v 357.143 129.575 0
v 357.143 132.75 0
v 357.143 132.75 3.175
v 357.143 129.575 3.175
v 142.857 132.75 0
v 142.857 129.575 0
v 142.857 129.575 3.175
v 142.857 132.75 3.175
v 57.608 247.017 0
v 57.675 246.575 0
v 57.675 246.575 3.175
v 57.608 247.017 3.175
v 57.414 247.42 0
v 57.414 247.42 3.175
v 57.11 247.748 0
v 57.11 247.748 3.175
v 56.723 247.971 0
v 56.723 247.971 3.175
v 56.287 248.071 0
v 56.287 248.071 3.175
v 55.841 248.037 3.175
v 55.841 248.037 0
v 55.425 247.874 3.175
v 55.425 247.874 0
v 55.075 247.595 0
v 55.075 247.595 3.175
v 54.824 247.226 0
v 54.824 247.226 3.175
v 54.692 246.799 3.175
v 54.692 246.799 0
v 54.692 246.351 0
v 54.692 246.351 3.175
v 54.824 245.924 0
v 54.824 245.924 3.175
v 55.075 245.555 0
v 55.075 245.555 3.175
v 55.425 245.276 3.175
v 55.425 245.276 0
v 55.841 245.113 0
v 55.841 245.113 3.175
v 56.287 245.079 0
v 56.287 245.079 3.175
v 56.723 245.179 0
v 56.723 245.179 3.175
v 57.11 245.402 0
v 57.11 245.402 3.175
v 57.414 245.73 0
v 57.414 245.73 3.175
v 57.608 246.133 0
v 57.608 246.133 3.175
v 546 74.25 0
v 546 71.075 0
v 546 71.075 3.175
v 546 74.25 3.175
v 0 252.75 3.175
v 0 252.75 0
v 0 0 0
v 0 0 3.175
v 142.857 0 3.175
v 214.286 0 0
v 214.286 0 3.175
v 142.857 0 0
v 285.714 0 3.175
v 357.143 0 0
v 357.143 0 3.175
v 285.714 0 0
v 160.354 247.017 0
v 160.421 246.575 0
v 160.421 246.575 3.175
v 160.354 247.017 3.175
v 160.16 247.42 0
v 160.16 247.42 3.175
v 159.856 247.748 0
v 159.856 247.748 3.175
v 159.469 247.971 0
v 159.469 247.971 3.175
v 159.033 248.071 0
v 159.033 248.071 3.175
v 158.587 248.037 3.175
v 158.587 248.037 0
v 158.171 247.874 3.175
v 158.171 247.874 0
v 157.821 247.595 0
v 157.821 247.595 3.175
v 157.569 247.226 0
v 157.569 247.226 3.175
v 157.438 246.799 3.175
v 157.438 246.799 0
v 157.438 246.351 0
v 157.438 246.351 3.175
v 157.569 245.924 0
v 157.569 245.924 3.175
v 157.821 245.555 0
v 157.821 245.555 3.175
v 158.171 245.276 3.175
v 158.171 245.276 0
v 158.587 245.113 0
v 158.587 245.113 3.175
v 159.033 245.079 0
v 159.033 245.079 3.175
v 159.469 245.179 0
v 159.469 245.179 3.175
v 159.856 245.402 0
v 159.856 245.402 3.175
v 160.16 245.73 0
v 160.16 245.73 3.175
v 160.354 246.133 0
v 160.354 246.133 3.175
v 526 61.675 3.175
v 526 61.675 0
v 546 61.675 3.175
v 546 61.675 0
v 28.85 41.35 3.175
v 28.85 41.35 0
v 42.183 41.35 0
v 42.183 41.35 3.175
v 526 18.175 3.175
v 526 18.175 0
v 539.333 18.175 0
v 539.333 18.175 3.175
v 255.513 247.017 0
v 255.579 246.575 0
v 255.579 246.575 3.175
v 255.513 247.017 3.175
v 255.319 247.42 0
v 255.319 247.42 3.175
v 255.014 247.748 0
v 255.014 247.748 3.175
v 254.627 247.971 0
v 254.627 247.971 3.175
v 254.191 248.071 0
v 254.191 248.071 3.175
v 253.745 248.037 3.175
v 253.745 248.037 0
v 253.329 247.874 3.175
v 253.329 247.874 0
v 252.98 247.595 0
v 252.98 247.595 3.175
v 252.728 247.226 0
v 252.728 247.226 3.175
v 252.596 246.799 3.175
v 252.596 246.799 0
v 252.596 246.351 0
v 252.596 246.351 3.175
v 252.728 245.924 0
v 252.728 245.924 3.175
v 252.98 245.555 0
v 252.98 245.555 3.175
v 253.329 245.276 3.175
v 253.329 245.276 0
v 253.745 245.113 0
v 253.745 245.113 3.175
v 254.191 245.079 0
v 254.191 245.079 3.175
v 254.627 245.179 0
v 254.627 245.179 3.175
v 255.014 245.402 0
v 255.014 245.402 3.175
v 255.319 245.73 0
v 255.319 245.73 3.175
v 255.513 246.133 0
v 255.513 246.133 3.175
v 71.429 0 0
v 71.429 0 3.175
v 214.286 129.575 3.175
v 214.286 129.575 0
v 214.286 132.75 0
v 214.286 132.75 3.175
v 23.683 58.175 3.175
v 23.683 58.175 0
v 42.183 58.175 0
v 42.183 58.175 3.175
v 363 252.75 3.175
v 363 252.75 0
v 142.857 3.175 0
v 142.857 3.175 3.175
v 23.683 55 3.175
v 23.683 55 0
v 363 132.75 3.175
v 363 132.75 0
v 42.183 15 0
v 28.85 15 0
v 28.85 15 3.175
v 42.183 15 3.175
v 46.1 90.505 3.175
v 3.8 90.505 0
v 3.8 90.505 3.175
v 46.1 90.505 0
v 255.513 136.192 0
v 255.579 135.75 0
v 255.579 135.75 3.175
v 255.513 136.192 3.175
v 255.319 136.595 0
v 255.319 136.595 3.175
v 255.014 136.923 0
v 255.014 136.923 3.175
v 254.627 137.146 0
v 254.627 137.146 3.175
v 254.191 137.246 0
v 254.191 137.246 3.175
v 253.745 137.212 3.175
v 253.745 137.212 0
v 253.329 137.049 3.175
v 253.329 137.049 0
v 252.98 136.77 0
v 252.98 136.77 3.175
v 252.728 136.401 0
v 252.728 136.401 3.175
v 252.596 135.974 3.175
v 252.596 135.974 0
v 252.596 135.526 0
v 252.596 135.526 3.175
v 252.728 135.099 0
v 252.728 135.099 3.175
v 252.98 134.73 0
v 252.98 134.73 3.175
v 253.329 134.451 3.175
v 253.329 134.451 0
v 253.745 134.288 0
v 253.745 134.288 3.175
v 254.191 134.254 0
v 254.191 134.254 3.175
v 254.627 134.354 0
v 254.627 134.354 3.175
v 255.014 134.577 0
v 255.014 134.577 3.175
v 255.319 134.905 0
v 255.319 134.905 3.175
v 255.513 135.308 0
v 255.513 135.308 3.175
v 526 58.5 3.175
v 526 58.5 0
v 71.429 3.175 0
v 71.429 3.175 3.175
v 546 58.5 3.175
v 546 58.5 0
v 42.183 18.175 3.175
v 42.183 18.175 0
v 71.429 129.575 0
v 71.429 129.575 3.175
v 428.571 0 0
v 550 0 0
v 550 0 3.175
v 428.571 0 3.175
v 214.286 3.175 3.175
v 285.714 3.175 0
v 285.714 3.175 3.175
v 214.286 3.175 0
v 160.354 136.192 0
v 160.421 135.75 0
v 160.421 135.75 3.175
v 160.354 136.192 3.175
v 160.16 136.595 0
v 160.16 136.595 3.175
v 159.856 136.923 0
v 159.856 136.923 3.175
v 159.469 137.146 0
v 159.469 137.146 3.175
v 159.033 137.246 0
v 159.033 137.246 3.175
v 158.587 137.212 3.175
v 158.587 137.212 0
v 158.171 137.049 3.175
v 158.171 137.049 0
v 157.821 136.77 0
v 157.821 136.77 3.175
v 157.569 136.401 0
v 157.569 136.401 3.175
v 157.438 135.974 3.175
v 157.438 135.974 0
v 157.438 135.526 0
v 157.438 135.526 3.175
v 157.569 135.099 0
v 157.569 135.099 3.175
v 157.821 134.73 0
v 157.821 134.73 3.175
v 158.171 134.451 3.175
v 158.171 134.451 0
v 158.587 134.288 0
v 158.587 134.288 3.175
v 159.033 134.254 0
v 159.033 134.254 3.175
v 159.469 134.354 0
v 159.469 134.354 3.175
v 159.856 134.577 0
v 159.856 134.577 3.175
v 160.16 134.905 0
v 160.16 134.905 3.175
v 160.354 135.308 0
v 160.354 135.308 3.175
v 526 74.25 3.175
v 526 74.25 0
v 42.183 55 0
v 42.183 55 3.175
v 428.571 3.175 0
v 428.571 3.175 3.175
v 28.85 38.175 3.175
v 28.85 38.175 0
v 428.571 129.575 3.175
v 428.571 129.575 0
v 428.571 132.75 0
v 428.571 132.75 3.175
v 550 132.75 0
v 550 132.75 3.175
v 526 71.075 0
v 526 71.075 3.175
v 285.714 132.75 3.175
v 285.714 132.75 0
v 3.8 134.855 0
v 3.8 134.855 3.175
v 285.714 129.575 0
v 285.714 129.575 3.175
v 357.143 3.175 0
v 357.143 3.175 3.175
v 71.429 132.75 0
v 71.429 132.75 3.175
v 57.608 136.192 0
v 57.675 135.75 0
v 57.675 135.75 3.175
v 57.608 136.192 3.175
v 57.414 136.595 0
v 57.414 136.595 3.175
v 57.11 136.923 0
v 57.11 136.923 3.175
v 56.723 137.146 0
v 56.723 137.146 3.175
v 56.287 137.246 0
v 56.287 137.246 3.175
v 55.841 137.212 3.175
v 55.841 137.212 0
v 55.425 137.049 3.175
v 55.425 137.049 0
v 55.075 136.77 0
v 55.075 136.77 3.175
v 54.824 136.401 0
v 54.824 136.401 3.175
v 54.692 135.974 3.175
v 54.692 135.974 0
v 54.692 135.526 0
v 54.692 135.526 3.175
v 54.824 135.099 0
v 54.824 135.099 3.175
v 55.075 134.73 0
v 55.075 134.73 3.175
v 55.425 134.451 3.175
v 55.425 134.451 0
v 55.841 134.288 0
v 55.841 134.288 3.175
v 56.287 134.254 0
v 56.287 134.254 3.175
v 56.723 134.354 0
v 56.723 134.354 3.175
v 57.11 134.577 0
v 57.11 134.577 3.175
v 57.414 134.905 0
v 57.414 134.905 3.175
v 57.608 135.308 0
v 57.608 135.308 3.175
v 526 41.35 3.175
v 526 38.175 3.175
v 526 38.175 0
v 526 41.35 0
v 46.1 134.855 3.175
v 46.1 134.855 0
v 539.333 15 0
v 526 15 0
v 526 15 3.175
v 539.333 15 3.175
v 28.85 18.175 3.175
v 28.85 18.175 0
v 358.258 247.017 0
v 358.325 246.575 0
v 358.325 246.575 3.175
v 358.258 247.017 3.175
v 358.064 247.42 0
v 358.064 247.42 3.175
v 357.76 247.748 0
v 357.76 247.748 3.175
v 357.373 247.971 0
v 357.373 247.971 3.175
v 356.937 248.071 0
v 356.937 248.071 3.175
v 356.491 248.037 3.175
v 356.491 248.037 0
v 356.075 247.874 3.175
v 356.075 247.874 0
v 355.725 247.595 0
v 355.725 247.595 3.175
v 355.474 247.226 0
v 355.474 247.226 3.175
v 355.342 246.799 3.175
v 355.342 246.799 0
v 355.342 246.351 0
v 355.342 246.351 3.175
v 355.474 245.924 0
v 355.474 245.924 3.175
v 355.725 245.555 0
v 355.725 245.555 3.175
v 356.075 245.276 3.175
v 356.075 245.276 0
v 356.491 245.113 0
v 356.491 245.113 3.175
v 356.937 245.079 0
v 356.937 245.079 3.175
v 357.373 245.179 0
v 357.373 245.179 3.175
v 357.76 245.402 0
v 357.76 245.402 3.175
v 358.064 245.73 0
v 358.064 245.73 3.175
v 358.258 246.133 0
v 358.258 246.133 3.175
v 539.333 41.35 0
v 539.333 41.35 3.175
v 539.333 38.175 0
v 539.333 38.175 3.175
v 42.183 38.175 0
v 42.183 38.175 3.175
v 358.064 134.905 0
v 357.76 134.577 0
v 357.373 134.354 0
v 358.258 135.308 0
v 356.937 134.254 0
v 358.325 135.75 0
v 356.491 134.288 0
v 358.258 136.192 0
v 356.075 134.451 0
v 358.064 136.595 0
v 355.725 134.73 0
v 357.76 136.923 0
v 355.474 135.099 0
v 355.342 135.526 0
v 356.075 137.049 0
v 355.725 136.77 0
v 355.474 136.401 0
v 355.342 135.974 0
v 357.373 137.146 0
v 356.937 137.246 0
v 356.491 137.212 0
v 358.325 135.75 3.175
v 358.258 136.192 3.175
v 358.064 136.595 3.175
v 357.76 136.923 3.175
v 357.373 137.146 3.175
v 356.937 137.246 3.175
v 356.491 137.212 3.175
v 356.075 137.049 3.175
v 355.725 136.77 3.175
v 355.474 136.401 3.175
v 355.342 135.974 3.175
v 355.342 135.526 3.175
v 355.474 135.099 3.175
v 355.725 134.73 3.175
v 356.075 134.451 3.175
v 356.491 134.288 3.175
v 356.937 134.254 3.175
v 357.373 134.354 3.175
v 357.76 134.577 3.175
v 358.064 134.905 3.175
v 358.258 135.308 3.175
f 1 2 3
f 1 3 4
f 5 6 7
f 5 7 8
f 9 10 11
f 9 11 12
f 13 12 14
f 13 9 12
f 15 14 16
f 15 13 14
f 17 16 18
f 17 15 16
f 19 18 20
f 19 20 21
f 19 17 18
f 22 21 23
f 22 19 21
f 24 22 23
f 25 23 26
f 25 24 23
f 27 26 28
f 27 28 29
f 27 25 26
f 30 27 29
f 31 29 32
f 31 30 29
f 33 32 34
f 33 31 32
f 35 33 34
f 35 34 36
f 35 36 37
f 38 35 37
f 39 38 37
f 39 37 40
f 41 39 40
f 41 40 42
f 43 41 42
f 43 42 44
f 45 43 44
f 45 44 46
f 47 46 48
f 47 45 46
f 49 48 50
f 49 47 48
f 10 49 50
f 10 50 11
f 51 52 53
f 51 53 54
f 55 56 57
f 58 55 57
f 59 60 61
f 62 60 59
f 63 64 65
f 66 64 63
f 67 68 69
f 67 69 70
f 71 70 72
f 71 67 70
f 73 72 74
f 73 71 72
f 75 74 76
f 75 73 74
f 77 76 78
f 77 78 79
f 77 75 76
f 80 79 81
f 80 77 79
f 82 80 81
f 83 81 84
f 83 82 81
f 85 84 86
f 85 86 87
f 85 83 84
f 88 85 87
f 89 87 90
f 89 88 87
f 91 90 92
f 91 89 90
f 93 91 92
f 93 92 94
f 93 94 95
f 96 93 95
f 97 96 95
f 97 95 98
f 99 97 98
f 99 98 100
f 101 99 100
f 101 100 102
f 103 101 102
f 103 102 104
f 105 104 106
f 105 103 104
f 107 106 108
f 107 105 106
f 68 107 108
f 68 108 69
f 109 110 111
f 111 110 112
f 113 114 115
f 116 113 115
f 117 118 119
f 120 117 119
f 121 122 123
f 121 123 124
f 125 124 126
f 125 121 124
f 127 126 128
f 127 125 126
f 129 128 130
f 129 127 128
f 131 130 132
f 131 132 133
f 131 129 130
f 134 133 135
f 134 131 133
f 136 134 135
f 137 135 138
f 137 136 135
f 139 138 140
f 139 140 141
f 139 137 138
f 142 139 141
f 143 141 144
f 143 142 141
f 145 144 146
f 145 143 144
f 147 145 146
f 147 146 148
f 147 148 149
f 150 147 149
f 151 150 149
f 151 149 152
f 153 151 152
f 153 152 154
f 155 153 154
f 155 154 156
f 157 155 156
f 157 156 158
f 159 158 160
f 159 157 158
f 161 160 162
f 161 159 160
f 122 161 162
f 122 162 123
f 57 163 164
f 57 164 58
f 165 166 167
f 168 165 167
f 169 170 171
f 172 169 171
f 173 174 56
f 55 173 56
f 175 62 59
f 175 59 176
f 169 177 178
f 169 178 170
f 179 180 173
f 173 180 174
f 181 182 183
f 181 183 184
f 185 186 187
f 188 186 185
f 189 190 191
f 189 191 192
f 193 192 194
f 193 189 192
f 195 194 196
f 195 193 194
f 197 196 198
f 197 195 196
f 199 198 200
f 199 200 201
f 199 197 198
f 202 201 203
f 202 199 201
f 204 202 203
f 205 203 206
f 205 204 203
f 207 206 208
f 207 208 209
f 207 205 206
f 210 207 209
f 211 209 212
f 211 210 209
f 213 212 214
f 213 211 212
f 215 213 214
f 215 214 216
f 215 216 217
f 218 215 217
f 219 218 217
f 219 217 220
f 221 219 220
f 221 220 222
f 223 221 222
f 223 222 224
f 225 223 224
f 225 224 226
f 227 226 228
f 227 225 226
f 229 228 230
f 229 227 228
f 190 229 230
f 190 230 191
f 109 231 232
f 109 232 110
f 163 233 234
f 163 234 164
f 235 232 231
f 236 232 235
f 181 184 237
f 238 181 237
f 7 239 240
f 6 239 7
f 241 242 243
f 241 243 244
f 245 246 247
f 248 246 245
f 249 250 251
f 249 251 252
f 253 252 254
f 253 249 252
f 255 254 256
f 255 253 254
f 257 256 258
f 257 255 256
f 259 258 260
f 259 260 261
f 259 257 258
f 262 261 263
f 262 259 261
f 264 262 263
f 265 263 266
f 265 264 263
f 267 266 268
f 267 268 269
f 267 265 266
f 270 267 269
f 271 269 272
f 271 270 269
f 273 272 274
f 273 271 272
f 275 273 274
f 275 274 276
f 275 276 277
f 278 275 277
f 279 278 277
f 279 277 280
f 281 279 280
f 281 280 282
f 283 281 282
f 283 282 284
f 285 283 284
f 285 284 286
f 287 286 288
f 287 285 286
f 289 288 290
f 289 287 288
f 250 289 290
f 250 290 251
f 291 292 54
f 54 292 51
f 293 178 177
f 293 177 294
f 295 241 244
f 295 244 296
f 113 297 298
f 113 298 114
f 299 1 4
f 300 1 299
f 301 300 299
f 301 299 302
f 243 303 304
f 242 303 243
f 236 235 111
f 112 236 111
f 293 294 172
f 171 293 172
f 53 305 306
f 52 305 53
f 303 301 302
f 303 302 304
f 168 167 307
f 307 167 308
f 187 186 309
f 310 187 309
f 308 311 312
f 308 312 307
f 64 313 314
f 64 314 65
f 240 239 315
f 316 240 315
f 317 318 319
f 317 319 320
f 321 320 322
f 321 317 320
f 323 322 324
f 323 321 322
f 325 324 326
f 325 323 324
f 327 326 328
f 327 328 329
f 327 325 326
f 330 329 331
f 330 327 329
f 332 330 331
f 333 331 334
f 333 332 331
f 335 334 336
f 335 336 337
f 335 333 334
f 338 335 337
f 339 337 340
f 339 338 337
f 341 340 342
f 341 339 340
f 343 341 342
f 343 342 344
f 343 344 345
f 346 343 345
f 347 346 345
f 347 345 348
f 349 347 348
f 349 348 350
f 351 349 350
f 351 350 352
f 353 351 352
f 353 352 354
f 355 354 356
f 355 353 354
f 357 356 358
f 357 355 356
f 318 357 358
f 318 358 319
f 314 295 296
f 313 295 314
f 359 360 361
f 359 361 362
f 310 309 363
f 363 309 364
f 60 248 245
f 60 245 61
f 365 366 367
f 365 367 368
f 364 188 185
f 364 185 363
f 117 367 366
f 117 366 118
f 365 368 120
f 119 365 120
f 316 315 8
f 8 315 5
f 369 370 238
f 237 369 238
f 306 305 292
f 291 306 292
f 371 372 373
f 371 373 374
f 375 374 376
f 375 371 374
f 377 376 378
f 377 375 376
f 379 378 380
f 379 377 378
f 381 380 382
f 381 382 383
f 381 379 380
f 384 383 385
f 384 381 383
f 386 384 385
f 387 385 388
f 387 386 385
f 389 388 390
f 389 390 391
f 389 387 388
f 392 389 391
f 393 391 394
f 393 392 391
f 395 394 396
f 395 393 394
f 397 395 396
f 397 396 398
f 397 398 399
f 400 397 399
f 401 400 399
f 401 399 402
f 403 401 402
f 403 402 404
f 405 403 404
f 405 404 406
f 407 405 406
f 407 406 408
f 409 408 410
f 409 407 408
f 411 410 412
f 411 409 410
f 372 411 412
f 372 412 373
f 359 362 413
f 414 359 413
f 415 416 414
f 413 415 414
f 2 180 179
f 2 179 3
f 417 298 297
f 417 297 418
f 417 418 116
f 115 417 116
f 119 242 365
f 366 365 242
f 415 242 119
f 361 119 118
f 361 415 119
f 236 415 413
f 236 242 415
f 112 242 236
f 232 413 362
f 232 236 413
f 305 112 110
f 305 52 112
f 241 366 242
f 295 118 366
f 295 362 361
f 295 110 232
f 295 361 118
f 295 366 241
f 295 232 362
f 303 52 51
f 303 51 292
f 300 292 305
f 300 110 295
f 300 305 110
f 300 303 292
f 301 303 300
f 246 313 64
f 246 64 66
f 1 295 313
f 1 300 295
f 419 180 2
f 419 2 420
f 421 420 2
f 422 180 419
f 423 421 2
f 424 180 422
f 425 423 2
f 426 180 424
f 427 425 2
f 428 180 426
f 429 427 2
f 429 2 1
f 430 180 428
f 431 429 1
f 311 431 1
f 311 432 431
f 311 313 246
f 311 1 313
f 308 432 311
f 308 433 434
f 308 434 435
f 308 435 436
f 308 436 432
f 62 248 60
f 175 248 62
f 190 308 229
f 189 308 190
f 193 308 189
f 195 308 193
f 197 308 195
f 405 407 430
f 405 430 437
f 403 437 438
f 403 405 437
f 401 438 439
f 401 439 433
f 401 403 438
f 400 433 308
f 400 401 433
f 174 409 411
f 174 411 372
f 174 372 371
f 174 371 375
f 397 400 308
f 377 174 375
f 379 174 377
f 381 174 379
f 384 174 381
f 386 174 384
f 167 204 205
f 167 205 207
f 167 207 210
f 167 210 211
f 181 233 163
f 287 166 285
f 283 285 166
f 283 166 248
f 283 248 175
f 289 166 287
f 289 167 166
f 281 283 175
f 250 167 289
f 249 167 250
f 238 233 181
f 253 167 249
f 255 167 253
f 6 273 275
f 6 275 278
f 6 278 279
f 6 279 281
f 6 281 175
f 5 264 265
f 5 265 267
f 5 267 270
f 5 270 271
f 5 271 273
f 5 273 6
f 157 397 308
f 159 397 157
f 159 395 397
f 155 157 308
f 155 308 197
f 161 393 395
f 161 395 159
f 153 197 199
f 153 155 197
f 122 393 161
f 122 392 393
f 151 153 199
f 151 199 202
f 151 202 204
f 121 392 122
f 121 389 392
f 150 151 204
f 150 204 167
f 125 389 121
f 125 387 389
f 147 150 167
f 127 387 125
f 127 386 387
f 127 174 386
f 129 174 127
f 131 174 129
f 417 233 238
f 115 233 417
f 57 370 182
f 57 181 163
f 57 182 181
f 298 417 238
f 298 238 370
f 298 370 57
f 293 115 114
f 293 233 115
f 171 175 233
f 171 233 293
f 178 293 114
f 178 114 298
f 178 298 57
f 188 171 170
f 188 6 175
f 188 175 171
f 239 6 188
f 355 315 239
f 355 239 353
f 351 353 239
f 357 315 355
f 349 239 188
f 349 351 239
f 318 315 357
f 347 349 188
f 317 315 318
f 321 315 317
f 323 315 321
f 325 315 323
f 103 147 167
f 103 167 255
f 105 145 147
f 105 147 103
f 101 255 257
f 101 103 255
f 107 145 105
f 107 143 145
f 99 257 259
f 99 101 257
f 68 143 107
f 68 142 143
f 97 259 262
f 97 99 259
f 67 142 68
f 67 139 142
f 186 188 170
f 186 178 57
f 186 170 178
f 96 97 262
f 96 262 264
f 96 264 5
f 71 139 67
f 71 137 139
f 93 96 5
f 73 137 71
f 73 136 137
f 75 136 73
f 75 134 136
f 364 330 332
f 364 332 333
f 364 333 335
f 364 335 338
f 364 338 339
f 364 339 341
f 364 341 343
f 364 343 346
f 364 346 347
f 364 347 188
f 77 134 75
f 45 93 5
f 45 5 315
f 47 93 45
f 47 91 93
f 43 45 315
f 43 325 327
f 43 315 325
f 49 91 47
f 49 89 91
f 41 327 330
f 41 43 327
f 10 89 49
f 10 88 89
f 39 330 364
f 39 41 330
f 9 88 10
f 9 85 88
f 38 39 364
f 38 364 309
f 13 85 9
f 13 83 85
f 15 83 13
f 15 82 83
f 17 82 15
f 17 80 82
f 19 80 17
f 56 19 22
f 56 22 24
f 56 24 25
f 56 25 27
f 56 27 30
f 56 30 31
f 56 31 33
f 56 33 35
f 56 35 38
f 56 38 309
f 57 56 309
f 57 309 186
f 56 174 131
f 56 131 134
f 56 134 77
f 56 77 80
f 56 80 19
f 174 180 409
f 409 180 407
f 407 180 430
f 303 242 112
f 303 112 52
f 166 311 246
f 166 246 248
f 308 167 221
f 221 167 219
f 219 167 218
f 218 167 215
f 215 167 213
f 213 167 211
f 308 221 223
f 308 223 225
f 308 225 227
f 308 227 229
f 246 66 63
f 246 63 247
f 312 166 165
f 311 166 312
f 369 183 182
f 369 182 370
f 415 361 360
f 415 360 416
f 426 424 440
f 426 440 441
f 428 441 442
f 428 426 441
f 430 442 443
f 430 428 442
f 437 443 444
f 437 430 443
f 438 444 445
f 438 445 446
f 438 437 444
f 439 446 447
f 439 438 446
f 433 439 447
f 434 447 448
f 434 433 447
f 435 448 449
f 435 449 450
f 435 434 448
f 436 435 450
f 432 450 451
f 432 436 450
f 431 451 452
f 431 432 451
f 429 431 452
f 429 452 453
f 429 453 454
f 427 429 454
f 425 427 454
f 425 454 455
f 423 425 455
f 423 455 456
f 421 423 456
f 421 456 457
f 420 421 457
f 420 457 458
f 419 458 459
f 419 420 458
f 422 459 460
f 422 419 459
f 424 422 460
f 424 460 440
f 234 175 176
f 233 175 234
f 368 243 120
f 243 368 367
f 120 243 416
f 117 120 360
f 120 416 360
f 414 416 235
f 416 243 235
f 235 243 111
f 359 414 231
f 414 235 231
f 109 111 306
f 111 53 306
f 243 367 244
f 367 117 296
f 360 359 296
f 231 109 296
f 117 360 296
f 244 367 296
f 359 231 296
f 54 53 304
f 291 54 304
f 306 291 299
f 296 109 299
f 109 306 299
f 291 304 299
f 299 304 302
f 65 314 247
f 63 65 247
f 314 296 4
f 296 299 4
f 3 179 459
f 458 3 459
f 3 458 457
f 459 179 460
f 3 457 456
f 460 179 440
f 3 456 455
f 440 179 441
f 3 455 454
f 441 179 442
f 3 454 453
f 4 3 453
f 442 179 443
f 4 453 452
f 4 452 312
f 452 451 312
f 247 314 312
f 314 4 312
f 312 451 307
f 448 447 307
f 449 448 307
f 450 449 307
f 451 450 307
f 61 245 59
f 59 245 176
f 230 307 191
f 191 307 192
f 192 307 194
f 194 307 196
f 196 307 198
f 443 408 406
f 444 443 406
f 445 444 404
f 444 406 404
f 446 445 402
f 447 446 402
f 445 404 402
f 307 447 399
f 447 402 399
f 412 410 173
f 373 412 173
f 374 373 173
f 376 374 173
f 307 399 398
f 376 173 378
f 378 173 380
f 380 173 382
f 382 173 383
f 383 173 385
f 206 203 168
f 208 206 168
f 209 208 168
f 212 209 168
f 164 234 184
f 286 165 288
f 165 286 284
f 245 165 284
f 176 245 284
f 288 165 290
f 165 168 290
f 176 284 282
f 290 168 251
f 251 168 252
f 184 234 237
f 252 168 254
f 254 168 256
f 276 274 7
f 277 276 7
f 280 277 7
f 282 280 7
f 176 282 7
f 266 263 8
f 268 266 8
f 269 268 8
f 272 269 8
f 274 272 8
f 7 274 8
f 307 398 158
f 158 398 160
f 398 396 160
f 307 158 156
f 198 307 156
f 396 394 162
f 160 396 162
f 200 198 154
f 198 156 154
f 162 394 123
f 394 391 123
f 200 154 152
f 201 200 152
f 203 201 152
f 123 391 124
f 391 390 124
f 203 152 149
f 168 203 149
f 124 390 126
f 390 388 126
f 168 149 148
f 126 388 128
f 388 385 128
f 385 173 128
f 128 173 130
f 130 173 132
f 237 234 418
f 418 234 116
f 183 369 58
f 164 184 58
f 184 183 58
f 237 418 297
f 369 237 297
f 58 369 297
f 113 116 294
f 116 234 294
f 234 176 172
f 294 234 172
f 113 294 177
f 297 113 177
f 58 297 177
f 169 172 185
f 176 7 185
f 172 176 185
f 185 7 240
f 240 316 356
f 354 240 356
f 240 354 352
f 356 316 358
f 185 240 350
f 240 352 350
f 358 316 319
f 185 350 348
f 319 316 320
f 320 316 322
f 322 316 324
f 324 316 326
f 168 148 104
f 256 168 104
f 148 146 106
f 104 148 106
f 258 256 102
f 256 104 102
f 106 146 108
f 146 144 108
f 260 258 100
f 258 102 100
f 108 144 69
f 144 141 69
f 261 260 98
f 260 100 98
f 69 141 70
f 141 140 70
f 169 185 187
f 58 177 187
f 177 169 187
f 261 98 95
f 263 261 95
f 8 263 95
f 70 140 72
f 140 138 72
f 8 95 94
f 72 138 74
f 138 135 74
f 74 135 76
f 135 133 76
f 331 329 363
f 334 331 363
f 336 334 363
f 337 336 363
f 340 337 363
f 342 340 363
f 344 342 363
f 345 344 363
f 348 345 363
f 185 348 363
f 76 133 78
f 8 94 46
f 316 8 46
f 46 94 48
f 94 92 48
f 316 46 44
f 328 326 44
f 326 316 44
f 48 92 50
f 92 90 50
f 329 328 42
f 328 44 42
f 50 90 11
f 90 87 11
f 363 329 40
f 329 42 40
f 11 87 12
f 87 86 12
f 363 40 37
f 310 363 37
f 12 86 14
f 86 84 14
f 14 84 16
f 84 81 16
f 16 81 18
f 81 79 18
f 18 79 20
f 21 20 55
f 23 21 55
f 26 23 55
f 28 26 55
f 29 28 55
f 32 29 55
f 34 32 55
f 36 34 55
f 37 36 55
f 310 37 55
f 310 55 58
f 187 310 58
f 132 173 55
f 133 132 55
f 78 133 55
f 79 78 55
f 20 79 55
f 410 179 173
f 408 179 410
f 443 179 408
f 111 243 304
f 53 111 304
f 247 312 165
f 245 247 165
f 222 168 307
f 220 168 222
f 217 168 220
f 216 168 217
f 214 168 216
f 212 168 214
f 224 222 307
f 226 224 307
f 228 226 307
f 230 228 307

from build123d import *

# Parameters (mm, degrees)
SKETCH1_R           = 1.5
SKETCH1_W           = 71.428571428
SKETCH1_H           = 3.175
SKETCH1_W_2         = 20
SKETCH1_W_3         = 13.333
SKETCH1_W_4         = 42.3
SKETCH1_H_2         = 44.35
SKETCH1_W_5         = 18.5
BOSS_EXTRUDE1_DEPTH = 3.175


with BuildPart() as part:
    # Sketch1 → Boss-Extrude1 (new body)
    with BuildSketch(Plane.XY):
        Polygon((0, 0), (0, 132.75), (0, 252.75), (328.222222222, 252.75), (363, 252.75), (363, 228.115), (363, 132.75), (357.142857143, 132.75), (357.142857143, 129.575), (428.571428571, 129.575), (428.571428571, 132.75), (550, 132.75), (550, 0), (428.571428571, 0), (428.571428571, 3.175), (357.142857143, 3.175), (357.142857143, 0), (285.714285714, 0), (285.714285714, 3.175), (214.285714286, 3.175), (214.285714286, 0), (142.857142857, 0), (142.857142857, 3.175), (71.428571429, 3.175), (71.428571429, 0), align=None)
        with Locations((56.175, 246.575)):
            Circle(SKETCH1_R, mode=Mode.SUBTRACT)
        with Locations((158.920833333, 135.75)):
            Circle(SKETCH1_R, mode=Mode.SUBTRACT)
        with Locations((158.920833333, 246.575)):
            Circle(SKETCH1_R, mode=Mode.SUBTRACT)
        with Locations((254.079166667, 246.575)):
            Circle(SKETCH1_R, mode=Mode.SUBTRACT)
        with Locations((254.079166667, 135.75)):
            Circle(SKETCH1_R, mode=Mode.SUBTRACT)
        with Locations((356.825, 135.75)):
            Circle(SKETCH1_R, mode=Mode.SUBTRACT)
        with Locations((356.825, 246.575)):
            Circle(SKETCH1_R, mode=Mode.SUBTRACT)
        with Locations((56.175, 135.75)):
            Circle(SKETCH1_R, mode=Mode.SUBTRACT)
        with Locations((107.142857143, 131.1625)):
            Rectangle(SKETCH1_W, SKETCH1_H, mode=Mode.SUBTRACT)
        with Locations((250, 131.1625)):
            Rectangle(SKETCH1_W, SKETCH1_H, mode=Mode.SUBTRACT)
        with Locations((536, 60.0875)):
            Rectangle(SKETCH1_W_2, SKETCH1_H, mode=Mode.SUBTRACT)
        with Locations((536, 72.6625)):
            Rectangle(SKETCH1_W_2, SKETCH1_H, mode=Mode.SUBTRACT)
        with Locations((532.6665, 16.5875)):
            Rectangle(SKETCH1_W_3, SKETCH1_H, mode=Mode.SUBTRACT)
        with Locations((24.95, 112.68)):
            Rectangle(SKETCH1_W_4, SKETCH1_H_2, mode=Mode.SUBTRACT)
        with Locations((32.933020508, 56.5875)):
            Rectangle(SKETCH1_W_5, SKETCH1_H, mode=Mode.SUBTRACT)
        with Locations((35.516520508, 16.5875)):
            Rectangle(SKETCH1_W_3, SKETCH1_H, mode=Mode.SUBTRACT)
        with Locations((35.516520508, 39.7625)):
            Rectangle(SKETCH1_W_3, SKETCH1_H, mode=Mode.SUBTRACT)
        with Locations((532.6665, 39.7625)):
            Rectangle(SKETCH1_W_3, SKETCH1_H, mode=Mode.SUBTRACT)
    extrude(amount=BOSS_EXTRUDE1_DEPTH)


solid = part.part
